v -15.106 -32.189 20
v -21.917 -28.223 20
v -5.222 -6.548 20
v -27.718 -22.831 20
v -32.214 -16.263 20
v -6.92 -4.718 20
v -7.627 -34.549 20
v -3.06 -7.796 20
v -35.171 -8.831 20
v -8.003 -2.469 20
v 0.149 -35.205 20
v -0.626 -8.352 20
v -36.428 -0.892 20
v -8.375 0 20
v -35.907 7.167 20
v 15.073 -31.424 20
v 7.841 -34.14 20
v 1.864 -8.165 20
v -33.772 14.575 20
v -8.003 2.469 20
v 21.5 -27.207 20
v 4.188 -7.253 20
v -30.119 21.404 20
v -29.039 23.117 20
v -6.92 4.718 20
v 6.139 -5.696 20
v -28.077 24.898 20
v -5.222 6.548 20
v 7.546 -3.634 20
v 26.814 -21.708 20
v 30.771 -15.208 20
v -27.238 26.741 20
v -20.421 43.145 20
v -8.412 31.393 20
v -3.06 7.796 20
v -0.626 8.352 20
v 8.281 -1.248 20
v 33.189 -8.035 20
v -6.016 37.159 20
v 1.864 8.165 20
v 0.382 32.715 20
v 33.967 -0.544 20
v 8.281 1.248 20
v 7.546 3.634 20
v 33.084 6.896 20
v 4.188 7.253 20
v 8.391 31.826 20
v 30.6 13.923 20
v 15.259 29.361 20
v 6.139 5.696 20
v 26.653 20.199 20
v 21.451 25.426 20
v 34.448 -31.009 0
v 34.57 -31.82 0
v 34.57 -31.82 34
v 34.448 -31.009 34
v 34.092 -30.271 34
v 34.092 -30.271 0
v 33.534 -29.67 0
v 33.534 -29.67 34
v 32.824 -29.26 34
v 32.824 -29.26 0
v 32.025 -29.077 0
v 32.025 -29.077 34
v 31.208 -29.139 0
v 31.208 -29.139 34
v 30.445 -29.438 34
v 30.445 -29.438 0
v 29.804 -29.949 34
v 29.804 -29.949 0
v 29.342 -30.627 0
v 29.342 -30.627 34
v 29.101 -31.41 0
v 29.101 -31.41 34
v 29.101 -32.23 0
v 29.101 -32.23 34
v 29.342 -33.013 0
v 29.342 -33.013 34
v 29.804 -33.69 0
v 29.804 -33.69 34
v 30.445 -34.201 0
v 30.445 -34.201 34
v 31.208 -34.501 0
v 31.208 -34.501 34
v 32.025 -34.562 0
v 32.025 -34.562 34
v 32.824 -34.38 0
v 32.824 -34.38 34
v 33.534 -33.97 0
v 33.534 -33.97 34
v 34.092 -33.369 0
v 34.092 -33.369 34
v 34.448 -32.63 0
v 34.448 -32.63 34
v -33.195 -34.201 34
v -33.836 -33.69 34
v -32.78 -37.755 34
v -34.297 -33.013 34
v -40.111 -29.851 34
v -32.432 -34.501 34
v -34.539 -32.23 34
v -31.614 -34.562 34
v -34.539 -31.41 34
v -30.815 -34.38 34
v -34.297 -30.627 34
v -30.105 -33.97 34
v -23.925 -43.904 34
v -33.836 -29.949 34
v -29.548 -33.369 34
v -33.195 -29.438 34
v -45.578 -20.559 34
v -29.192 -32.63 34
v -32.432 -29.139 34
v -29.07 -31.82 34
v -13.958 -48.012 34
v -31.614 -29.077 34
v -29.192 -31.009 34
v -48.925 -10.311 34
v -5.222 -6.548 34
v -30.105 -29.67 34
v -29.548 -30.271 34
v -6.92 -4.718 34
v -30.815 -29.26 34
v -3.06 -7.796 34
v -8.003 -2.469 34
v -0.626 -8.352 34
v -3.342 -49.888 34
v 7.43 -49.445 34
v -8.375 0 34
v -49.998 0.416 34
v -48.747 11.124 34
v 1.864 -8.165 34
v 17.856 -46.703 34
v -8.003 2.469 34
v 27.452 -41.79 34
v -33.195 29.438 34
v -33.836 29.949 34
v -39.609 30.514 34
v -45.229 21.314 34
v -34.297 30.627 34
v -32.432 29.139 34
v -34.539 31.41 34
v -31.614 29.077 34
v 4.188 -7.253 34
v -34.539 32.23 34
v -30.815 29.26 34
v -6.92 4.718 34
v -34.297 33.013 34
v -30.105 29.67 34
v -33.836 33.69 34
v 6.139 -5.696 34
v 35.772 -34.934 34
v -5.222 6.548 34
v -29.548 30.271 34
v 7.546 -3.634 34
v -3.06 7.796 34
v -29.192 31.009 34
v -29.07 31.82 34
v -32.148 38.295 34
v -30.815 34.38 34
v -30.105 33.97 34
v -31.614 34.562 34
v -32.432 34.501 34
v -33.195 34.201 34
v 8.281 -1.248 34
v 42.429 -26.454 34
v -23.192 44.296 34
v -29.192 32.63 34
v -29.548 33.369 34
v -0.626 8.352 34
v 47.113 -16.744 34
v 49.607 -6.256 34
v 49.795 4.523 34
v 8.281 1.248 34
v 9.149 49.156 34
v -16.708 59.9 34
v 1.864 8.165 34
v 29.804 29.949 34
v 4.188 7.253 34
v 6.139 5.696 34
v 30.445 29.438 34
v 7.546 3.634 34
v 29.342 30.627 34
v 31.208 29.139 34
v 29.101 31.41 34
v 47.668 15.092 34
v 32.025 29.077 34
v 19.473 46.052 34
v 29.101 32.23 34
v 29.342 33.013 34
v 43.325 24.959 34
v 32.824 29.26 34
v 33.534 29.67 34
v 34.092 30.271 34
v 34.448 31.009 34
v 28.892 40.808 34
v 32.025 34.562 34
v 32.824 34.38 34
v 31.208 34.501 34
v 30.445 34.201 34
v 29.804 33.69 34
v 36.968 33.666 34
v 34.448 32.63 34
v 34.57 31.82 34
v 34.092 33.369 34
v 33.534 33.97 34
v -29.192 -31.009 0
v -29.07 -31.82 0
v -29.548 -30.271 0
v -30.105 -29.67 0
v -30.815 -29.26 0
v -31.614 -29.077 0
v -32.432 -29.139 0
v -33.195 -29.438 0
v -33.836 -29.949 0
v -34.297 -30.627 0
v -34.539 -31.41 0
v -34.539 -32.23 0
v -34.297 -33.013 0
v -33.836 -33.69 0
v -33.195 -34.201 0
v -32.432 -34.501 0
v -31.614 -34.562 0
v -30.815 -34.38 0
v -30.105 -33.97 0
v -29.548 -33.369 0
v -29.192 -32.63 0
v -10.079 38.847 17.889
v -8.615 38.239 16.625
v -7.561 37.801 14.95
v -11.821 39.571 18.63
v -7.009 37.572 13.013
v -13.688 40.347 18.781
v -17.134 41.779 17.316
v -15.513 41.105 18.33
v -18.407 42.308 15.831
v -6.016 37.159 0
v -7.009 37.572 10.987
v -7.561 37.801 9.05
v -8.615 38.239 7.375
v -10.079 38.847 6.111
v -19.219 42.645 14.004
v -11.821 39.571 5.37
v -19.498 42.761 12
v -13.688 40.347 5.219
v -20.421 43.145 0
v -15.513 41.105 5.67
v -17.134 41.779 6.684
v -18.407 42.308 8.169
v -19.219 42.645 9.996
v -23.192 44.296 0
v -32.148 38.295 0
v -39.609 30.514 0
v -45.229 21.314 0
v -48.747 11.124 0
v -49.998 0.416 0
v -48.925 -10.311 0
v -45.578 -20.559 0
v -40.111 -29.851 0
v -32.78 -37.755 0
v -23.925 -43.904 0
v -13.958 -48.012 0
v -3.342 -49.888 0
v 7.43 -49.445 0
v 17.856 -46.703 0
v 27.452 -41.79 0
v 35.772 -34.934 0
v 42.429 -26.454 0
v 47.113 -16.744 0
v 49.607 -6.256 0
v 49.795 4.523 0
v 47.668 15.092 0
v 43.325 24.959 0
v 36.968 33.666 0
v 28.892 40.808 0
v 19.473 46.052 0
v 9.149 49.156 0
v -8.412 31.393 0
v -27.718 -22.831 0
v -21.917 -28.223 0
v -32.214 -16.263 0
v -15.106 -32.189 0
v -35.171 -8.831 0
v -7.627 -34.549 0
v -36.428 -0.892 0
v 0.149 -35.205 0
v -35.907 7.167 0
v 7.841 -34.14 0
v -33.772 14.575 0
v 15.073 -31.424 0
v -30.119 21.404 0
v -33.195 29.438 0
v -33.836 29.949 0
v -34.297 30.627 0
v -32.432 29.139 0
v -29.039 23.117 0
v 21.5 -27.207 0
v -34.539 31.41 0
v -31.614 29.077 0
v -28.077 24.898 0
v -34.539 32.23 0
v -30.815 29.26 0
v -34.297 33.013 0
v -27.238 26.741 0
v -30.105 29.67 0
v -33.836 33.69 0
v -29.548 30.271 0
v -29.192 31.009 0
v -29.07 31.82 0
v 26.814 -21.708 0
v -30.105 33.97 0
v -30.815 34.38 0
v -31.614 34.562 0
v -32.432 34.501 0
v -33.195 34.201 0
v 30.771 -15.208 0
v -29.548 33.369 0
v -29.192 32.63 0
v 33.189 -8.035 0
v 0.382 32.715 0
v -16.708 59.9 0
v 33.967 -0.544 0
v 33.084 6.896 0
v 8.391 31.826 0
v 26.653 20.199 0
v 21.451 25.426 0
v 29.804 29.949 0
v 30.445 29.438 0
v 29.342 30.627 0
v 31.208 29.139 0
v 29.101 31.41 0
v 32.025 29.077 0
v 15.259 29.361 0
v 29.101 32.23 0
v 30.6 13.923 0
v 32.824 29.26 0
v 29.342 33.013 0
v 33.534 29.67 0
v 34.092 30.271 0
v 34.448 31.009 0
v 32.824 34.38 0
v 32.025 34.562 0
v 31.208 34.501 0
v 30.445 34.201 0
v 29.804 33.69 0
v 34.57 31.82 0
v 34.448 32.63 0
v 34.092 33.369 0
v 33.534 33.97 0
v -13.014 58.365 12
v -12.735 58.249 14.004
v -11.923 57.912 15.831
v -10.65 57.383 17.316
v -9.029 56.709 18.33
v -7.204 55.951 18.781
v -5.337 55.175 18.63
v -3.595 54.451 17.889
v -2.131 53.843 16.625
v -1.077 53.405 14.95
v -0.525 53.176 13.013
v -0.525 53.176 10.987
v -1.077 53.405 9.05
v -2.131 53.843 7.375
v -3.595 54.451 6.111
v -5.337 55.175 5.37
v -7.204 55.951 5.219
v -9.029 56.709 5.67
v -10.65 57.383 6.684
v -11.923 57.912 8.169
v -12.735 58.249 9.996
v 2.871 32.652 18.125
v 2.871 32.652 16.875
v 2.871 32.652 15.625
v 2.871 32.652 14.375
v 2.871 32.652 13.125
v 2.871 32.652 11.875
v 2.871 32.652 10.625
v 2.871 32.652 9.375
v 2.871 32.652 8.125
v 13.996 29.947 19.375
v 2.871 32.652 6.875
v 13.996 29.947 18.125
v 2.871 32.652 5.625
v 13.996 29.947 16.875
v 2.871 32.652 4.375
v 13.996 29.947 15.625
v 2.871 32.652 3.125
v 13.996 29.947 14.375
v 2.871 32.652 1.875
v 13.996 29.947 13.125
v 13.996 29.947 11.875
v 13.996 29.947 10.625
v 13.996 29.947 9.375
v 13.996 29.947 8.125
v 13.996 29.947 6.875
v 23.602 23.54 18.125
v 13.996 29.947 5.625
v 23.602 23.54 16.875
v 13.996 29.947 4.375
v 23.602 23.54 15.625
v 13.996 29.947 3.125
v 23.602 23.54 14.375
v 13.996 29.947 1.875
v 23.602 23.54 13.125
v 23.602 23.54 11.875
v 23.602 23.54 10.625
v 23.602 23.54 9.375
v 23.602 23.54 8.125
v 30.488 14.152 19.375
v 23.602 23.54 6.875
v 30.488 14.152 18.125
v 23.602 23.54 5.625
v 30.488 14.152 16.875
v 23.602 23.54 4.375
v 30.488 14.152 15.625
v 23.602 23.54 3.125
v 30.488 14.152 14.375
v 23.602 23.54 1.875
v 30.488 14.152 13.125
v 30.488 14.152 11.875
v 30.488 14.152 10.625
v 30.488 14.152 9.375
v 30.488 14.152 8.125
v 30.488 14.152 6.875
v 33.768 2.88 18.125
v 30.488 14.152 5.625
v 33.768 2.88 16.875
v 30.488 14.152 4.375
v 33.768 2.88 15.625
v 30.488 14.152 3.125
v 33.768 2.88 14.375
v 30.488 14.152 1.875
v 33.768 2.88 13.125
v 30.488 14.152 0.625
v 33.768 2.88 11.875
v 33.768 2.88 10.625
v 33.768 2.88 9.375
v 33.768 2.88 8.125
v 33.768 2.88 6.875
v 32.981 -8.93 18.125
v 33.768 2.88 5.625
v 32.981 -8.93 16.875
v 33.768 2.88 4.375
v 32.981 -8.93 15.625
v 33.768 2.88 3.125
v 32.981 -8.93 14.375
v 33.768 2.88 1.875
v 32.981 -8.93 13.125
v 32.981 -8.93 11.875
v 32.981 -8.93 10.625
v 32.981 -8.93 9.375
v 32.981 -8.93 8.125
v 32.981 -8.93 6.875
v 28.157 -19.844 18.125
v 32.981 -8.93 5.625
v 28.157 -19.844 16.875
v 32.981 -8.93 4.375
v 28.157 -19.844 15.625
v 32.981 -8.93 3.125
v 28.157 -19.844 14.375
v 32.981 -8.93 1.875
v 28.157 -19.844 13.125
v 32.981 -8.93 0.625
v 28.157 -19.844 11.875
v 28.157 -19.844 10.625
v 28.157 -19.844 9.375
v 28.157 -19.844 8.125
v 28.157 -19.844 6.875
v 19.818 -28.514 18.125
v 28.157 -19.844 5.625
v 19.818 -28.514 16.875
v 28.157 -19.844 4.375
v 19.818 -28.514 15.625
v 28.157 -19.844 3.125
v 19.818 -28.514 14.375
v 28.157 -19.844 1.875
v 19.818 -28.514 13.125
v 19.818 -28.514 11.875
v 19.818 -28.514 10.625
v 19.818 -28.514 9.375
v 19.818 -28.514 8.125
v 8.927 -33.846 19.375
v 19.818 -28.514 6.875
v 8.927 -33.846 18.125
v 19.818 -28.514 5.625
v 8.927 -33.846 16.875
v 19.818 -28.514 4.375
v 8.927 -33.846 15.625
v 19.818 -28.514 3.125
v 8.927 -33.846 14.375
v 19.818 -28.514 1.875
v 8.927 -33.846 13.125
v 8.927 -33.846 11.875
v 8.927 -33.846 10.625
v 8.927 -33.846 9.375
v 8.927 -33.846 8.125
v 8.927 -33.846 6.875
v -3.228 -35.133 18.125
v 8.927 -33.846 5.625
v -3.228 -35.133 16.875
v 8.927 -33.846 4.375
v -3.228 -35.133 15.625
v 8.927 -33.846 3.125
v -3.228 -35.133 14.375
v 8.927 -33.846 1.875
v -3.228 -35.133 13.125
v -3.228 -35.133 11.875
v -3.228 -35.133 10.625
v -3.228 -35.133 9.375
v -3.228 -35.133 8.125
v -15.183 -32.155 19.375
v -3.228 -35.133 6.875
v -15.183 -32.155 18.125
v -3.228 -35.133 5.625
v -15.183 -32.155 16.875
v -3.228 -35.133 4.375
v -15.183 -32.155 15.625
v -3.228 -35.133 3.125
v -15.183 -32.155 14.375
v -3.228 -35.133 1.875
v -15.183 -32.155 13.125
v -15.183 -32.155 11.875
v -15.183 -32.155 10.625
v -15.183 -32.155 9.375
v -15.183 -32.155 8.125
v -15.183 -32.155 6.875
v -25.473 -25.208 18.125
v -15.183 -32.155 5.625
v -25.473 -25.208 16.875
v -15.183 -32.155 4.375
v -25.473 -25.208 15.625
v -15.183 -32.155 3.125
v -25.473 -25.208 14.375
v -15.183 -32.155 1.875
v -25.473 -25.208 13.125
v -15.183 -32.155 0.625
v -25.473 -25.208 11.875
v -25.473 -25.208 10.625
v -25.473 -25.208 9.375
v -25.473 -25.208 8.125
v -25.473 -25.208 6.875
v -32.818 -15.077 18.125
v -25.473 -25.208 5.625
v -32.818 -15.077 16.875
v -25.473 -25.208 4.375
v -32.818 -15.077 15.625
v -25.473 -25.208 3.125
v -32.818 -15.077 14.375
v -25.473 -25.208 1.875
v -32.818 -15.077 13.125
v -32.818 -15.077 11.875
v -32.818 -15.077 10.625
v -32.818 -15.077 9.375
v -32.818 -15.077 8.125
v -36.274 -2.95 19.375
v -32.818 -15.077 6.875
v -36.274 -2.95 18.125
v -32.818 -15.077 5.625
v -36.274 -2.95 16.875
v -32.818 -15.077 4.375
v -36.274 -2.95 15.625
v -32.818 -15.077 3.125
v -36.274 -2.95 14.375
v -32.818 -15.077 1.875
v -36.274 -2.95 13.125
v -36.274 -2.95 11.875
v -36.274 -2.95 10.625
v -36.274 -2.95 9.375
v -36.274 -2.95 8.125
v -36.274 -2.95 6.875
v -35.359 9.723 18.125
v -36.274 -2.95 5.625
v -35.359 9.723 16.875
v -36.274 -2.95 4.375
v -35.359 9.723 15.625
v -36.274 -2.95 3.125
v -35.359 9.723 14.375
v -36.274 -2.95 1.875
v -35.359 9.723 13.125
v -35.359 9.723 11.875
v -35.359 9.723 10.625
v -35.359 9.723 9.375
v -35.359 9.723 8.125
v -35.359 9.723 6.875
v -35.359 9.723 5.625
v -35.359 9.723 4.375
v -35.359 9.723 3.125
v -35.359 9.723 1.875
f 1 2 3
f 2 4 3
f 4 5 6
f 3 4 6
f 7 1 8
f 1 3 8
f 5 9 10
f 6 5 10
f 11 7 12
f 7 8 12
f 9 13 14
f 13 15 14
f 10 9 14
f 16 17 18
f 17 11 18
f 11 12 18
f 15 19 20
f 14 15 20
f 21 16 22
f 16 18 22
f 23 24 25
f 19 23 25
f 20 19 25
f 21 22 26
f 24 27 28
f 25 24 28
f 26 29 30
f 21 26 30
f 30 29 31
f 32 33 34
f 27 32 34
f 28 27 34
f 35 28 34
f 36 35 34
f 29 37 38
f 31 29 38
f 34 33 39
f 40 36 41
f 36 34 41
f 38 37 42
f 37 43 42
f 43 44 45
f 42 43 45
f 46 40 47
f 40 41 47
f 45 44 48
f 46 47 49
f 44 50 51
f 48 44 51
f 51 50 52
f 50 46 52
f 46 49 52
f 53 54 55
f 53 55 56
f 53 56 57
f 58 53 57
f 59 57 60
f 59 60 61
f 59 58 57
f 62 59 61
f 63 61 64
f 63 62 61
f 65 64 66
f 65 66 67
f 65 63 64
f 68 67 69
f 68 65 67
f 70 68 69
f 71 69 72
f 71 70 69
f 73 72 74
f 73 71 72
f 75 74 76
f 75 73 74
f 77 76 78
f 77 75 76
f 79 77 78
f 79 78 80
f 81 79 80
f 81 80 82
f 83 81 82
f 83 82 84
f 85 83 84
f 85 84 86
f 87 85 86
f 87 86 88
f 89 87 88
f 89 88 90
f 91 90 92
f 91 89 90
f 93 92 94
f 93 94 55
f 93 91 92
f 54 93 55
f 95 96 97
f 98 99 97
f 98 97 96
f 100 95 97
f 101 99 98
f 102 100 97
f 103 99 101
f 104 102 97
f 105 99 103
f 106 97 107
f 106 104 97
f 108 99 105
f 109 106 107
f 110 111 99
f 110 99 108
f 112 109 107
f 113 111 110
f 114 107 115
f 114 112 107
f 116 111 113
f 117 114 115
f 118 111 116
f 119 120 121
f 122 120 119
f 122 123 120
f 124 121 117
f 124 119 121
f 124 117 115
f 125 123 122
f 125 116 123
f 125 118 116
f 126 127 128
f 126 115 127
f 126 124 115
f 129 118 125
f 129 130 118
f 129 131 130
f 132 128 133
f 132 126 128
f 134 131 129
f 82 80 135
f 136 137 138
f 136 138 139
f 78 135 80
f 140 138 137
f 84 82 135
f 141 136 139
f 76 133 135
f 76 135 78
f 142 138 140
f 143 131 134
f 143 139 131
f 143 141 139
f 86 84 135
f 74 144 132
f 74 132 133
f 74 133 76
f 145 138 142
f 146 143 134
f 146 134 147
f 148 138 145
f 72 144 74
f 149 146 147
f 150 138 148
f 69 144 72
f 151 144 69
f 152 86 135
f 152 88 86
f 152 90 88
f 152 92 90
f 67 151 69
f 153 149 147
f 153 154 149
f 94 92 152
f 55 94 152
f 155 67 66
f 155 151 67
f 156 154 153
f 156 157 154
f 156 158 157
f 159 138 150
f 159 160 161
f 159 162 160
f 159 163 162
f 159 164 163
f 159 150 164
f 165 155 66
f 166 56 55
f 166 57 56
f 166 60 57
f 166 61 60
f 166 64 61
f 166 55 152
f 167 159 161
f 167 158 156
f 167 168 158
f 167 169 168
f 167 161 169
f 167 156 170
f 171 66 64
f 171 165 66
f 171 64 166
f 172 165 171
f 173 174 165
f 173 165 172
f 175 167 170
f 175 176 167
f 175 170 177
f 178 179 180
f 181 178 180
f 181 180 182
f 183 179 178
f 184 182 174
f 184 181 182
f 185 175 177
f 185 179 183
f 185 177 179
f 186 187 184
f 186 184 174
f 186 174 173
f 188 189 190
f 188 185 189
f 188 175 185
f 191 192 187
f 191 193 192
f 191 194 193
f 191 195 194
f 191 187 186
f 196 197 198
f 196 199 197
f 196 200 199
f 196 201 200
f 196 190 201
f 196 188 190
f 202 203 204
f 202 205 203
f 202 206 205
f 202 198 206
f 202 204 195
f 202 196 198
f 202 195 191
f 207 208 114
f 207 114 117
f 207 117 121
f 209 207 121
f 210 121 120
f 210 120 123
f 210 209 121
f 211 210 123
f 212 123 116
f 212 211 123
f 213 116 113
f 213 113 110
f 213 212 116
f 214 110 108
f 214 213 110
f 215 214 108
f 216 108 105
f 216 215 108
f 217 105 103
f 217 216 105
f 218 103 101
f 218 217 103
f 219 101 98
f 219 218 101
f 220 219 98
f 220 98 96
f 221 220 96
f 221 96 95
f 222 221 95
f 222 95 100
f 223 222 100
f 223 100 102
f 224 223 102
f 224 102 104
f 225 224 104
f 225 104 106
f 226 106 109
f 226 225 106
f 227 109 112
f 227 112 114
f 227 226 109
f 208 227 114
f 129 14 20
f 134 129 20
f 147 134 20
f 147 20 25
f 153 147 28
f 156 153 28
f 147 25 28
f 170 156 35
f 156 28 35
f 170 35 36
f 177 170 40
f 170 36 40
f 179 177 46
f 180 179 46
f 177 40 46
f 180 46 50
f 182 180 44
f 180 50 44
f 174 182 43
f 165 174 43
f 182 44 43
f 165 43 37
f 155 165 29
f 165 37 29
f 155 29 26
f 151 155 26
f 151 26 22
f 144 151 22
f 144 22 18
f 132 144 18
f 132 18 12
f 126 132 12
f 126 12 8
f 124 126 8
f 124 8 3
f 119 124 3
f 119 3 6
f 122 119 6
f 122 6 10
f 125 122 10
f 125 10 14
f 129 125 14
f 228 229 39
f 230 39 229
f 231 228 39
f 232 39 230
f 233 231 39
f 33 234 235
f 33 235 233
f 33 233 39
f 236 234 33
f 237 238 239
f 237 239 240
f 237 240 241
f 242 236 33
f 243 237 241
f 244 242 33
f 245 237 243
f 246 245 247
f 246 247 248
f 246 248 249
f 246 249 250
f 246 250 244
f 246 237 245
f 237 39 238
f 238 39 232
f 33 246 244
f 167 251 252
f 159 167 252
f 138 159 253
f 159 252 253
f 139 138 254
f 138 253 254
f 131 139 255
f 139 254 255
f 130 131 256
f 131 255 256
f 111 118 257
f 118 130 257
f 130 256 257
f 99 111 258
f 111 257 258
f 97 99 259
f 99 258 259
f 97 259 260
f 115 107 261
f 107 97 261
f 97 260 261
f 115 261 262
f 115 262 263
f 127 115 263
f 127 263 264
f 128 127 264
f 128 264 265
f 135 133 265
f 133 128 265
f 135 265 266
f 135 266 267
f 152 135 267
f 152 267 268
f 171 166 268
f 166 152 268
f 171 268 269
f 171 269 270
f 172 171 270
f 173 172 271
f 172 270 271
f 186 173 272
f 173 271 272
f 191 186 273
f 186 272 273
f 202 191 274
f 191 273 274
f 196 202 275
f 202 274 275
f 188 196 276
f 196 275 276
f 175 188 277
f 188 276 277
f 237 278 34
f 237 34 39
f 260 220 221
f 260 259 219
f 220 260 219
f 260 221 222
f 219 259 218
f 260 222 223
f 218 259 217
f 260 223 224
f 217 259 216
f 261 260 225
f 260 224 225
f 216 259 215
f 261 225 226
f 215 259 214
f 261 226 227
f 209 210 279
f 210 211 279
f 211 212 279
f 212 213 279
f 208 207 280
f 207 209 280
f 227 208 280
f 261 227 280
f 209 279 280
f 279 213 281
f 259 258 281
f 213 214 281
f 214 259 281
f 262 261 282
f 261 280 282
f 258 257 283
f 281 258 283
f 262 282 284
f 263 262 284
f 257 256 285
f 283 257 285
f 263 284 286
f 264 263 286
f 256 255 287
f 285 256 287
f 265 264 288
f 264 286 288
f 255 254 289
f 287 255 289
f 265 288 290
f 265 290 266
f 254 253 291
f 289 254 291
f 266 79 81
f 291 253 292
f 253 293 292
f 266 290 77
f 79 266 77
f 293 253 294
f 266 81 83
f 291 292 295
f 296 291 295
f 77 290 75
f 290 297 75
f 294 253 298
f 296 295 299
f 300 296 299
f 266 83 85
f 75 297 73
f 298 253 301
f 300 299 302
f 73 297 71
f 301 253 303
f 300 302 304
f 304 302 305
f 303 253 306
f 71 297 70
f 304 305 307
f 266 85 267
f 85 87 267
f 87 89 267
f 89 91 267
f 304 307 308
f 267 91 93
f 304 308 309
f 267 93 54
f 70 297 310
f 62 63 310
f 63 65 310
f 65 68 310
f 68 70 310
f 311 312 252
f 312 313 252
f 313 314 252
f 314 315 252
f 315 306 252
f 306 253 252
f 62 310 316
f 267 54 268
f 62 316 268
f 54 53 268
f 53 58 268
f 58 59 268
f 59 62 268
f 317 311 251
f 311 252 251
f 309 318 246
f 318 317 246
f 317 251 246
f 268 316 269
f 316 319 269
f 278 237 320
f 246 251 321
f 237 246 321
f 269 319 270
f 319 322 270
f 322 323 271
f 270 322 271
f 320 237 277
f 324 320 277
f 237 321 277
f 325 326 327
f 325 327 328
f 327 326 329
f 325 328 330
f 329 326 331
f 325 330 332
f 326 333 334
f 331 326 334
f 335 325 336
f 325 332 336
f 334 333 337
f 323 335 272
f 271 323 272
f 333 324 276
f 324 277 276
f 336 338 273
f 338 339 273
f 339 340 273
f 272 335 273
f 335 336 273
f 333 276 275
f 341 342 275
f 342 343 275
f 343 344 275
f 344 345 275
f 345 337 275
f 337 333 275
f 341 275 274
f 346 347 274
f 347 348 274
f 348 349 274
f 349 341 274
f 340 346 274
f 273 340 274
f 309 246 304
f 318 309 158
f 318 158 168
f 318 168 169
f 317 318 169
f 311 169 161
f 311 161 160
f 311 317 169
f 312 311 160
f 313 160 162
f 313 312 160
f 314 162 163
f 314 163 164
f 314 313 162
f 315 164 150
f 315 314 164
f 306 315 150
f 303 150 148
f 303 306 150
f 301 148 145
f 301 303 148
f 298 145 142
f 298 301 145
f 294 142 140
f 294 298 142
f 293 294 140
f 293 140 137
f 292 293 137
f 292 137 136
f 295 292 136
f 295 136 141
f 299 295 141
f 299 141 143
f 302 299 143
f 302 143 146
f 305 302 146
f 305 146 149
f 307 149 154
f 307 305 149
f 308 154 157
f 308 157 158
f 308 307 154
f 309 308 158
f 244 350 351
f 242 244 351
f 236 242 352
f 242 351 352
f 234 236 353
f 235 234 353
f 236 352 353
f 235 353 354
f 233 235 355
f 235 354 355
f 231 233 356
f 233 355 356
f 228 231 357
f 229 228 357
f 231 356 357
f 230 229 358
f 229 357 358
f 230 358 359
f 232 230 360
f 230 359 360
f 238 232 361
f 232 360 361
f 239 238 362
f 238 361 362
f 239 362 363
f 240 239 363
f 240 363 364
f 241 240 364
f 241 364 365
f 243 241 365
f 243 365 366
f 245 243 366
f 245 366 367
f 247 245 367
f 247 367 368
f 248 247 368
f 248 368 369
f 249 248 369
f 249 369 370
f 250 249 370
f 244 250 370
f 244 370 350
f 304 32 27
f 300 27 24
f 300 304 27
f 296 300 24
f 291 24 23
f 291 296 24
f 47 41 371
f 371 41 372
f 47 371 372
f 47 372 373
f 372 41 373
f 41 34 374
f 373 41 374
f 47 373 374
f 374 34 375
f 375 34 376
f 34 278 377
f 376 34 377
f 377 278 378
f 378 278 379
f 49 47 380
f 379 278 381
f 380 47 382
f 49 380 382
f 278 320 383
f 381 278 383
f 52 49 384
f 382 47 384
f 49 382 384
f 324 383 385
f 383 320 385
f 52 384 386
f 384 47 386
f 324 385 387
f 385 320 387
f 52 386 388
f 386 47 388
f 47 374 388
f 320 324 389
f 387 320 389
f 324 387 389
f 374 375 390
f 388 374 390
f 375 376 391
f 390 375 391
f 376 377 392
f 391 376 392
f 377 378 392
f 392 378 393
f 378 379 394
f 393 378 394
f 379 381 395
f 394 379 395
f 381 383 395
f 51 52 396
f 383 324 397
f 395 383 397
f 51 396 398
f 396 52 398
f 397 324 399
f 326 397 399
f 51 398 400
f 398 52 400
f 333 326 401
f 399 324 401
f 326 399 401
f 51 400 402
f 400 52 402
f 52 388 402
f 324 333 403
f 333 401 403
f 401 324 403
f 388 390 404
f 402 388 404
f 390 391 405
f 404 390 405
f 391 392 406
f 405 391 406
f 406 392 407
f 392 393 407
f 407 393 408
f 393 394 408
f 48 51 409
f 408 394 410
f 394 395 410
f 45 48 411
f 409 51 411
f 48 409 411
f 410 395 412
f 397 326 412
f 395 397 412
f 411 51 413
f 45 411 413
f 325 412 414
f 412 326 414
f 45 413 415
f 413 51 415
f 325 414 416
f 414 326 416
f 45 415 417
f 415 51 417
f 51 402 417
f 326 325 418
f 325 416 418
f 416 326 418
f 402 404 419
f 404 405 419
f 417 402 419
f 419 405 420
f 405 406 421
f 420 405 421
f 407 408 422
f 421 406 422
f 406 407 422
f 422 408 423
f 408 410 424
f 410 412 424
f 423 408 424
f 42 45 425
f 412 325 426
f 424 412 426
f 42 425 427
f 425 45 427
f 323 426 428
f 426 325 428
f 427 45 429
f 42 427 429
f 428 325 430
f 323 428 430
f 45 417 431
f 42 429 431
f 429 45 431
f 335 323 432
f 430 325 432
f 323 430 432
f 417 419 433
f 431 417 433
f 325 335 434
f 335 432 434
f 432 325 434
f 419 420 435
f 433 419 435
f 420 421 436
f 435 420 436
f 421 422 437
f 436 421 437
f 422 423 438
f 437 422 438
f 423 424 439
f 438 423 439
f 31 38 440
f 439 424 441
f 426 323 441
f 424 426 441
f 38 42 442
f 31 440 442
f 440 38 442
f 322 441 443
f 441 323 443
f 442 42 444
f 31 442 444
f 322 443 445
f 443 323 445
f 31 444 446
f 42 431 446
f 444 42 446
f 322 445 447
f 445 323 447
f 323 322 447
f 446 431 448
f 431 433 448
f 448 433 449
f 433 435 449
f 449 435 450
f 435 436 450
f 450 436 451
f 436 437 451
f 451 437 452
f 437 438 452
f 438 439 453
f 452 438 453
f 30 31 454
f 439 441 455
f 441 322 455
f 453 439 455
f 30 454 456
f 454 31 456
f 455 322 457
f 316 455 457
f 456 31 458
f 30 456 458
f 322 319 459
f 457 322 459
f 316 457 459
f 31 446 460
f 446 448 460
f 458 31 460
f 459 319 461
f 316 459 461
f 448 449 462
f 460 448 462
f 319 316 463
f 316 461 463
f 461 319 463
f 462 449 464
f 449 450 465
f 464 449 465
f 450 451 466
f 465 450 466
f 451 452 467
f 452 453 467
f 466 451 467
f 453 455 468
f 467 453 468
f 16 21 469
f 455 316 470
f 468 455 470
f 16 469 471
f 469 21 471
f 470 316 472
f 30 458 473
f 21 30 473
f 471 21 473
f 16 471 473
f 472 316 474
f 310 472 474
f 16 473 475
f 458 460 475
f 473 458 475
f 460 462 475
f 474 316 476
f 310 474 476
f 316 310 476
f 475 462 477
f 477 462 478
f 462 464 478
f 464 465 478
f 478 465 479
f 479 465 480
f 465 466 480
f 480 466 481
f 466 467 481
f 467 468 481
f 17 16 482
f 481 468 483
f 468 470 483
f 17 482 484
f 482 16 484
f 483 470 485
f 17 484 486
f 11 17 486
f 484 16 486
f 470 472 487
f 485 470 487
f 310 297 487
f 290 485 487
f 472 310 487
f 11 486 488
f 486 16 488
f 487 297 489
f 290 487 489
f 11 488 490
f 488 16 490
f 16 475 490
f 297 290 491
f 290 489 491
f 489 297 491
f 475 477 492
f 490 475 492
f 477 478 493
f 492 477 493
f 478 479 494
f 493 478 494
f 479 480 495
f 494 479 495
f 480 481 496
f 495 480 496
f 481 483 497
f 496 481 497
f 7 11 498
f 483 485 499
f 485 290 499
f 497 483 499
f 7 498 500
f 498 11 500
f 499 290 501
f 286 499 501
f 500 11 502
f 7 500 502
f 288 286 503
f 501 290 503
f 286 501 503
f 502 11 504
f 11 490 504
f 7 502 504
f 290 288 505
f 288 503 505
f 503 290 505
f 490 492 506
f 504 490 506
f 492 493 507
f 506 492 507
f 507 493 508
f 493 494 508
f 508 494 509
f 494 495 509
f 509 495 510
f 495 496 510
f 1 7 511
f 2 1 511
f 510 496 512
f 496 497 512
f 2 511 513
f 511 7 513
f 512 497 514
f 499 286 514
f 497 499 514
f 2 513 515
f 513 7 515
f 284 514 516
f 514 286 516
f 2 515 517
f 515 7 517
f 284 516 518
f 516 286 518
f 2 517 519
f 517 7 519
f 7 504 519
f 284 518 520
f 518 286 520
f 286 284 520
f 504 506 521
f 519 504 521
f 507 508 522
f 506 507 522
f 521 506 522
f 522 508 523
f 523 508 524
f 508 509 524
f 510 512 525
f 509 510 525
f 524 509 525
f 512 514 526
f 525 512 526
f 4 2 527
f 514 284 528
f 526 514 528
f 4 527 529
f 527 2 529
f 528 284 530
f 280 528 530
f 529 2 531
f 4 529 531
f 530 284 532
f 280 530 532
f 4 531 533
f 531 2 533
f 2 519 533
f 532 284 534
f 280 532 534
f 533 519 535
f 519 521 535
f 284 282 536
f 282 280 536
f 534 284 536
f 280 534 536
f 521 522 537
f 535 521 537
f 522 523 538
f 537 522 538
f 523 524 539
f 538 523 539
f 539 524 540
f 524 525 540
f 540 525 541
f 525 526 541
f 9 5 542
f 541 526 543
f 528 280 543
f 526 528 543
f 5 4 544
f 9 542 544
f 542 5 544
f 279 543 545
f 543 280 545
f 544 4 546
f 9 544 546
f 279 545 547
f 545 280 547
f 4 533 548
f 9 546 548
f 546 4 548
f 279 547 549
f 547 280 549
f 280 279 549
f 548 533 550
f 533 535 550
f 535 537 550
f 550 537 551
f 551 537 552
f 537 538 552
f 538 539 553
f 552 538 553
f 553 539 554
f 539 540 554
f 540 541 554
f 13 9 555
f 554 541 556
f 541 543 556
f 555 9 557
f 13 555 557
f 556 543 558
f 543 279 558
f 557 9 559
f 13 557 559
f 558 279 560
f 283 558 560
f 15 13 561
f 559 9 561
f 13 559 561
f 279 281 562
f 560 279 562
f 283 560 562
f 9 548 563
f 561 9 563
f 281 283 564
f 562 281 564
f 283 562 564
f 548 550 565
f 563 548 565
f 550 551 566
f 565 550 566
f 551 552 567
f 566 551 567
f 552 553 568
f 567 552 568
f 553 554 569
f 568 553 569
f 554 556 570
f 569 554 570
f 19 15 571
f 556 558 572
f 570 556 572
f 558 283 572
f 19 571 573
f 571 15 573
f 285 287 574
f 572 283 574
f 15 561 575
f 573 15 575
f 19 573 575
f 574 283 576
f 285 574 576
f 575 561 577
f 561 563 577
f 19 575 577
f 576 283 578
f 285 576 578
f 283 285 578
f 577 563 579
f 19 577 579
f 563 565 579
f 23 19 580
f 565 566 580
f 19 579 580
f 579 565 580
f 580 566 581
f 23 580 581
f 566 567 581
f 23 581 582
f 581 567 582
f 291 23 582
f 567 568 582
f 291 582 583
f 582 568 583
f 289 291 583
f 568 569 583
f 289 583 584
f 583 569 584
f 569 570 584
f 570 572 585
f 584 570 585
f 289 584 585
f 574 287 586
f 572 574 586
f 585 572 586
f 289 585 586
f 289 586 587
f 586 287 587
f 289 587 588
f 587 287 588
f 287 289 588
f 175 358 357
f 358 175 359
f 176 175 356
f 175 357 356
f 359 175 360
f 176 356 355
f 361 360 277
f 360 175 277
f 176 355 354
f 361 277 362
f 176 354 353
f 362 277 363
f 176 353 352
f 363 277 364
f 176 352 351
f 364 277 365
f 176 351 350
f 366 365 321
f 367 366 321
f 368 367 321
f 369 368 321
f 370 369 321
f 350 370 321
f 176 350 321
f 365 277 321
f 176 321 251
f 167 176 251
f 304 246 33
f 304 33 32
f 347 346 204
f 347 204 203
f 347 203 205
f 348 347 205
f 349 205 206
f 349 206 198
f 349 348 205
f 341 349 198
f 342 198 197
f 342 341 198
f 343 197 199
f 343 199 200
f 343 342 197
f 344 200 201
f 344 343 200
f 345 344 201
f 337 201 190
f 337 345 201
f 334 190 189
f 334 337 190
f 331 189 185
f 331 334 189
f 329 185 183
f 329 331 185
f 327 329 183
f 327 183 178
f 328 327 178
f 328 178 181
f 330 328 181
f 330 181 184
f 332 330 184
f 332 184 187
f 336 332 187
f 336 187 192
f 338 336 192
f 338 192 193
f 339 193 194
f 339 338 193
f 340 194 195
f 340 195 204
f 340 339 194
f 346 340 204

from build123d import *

# Parameters (mm, degrees)
SKETCH3_R                     = 50
SKETCH3_R_2                   = 2.75
EXTRUDE1_DEPTH                = 34
CUT_EXTRUDE2_DEPTH            = 20
EXTRUDE6_DEPTH                = 34
M16_75_16_75_DIAMETER_HOLE1_D = 16.75
CUT_EXTRUDE3_REACH            = 116.262
SKETCH22_R                    = 6.8


with BuildPart() as part:
    # Sketch3 → Extrude1 (new body)
    with BuildSketch(Plane.XY):
        Circle(SKETCH3_R)
        with Locations((31.819805153, -31.819805153)):
            Circle(SKETCH3_R_2, mode=Mode.SUBTRACT)
        with Locations((-31.819805153, -31.819805153)):
            Circle(SKETCH3_R_2, mode=Mode.SUBTRACT)
        with Locations((31.819805153, 31.819805153)):
            Circle(SKETCH3_R_2, mode=Mode.SUBTRACT)
        with Locations((-31.819805153, 31.819805153)):
            Circle(SKETCH3_R_2, mode=Mode.SUBTRACT)
    extrude(amount=EXTRUDE1_DEPTH)

    # Sketch3_6 → Cut-Extrude2 (cut)
    with BuildSketch(Plane.XY):
        with BuildLine():
            Line((-20.421328258, 43.144950309), (-27.237880936, 26.740610009))
            ThreePointArc((-27.237880936, 26.740610009), (-28.54324707, 23.999538948), (-30.118972052, 21.404439318))
            add(Edge.make_bspline(
                [(-8.411618966, 31.392589354), (-6.594986557, 31.927343906), (-4.727596656, 32.304011663), (-0.947579394, 32.726950043), (0.964989801, 32.773208373), (4.777108777, 32.531081057), (6.676598891, 32.242693441), (10.404207822, 31.337263886), (12.232267294, 30.720230446), (15.760360448, 29.173637758), (17.460336939, 28.244097303), (20.679062247, 26.098347596), (22.197757805, 24.882166939), (25.005835643, 22.198009273), (26.295170268, 20.730069861), (28.60307704, 17.585286262), (29.621608652, 15.90848759), (31.354425209, 12.395644964), (32.068678043, 10.559653108), (33.168512452, 6.783381836), (33.554071399, 4.84315955), (33.981977998, 0.91703866), (34.024313279, -1.068799499), (33.761644813, -5.025657895), (33.456639413, -6.996616206), (32.505786005, -10.863180522), (31.859947203, -12.758725015), (30.244434466, -16.415746217), (29.274780398, -18.177163724), (27.038718465, -21.510852538), (25.772340603, -23.083068793), (22.979235835, -25.988634722), (21.452548225, -27.321935222), (18.18350905, -29.706877352), (16.441204938, -30.758477245), (12.792592203, -32.545523582), (10.886337796, -33.28093707), (6.966927518, -34.410539179), (4.95383101, -34.804704707), (0.881572969, -35.237007362), (-1.17752584, -35.275132047), (-5.279057127, -34.991353155), (-7.321425423, -34.669448256), (-11.326780574, -33.672621975), (-13.289703752, -32.997710517), (-17.075395447, -31.312765708), (-18.898102754, -30.302753307), (-22.346412369, -27.975919739), (-23.971957836, -26.659129989), (-26.974594454, -23.756685335), (-28.351634915, -22.171071432), (-30.813133029, -18.777462502), (-31.89754775, -16.969516871), (-33.738297145, -13.184908034), (-34.494598024, -11.208301165), (-35.653409825, -7.145620969), (-36.055897198, -5.05960924), (-36.492023631, -0.841182208), (-36.525650191, 1.29116809), (-36.220191785, 5.537304064), (-35.881105833, 7.651023301), (-34.837758132, 11.795003117), (-34.13350703, 13.825197856), (-32.378618873, 17.739300975), (-31.328003859, 19.623146143), (-30.118972052, 21.404439318)],
                knots=[0, 0, 0, 0, 0.03125, 0.03125, 0.0625, 0.0625, 0.09375, 0.09375, 0.125, 0.125, 0.15625, 0.15625, 0.1875, 0.1875, 0.21875, 0.21875, 0.25, 0.25, 0.28125, 0.28125, 0.3125, 0.3125, 0.34375, 0.34375, 0.375, 0.375, 0.40625, 0.40625, 0.4375, 0.4375, 0.46875, 0.46875, 0.5, 0.5, 0.53125, 0.53125, 0.5625, 0.5625, 0.59375, 0.59375, 0.625, 0.625, 0.65625, 0.65625, 0.6875, 0.6875, 0.71875, 0.71875, 0.75, 0.75, 0.78125, 0.78125, 0.8125, 0.8125, 0.84375, 0.84375, 0.875, 0.875, 0.90625, 0.90625, 0.9375, 0.9375, 0.96875, 0.96875, 1, 1, 1, 1], degree=3))
            Line((-8.411618966, 31.392589354), (-6.015539335, 37.158862647))
            Line((-6.015539335, 37.158862647), (-20.421328258, 43.144950309))
        make_face()
    extrude(amount=CUT_EXTRUDE2_DEPTH, mode=Mode.SUBTRACT)

    # Sketch3_7 → Extrude6 (add)
    with BuildSketch(Plane.XY):
        with BuildLine():
            ThreePointArc((-23.191672282, 44.296121013), (-21.196140075, 45.284916318), (-19.158555872, 46.183868795))
            ThreePointArc((-19.158555872, 46.183868795), (-10.101449269, 48.968977145), (-0.681547061, 49.99535472))
            ThreePointArc((-0.681547061, 49.99535472), (4.254411372, 49.818671037), (9.148855424, 49.155858699))
            Line((9.148855424, 49.155858699), (-16.707688798, 59.900118605))
            Line((-16.707688798, 59.900118605), (-23.191672282, 44.296121013))
        make_face()
    extrude(amount=EXTRUDE6_DEPTH)

    # M16.75 _16.75_ Diameter Hole1 (through all)
    with Locations(Plane.XY.offset(34)):
        with Locations((0, 0)):
            Hole(M16_75_16_75_DIAMETER_HOLE1_D / 2)

    # Sketch22 → Cut-Extrude3 (cut, up to next)
    with BuildSketch(Plane(origin=(18.765429823, 45.159850034, 0), x_dir=(-0.923448008, 0.383723568, 0), z_dir=(0.383723568, 0.923448008, 0)), mode=Mode.PRIVATE) as cut_extrude3_sk1:
        with Locations((27.613769175, 12)):
            Circle(SKETCH22_R)
    cut_extrude3_tool1 = extrude(cut_extrude3_sk1.sketch, amount=-CUT_EXTRUDE3_REACH, mode=Mode.PRIVATE) & part.part
    add(cut_extrude3_tool1.solids().sort_by_distance((-6.73445, 55.755904, 12))[0], mode=Mode.SUBTRACT)


solid = part.part
